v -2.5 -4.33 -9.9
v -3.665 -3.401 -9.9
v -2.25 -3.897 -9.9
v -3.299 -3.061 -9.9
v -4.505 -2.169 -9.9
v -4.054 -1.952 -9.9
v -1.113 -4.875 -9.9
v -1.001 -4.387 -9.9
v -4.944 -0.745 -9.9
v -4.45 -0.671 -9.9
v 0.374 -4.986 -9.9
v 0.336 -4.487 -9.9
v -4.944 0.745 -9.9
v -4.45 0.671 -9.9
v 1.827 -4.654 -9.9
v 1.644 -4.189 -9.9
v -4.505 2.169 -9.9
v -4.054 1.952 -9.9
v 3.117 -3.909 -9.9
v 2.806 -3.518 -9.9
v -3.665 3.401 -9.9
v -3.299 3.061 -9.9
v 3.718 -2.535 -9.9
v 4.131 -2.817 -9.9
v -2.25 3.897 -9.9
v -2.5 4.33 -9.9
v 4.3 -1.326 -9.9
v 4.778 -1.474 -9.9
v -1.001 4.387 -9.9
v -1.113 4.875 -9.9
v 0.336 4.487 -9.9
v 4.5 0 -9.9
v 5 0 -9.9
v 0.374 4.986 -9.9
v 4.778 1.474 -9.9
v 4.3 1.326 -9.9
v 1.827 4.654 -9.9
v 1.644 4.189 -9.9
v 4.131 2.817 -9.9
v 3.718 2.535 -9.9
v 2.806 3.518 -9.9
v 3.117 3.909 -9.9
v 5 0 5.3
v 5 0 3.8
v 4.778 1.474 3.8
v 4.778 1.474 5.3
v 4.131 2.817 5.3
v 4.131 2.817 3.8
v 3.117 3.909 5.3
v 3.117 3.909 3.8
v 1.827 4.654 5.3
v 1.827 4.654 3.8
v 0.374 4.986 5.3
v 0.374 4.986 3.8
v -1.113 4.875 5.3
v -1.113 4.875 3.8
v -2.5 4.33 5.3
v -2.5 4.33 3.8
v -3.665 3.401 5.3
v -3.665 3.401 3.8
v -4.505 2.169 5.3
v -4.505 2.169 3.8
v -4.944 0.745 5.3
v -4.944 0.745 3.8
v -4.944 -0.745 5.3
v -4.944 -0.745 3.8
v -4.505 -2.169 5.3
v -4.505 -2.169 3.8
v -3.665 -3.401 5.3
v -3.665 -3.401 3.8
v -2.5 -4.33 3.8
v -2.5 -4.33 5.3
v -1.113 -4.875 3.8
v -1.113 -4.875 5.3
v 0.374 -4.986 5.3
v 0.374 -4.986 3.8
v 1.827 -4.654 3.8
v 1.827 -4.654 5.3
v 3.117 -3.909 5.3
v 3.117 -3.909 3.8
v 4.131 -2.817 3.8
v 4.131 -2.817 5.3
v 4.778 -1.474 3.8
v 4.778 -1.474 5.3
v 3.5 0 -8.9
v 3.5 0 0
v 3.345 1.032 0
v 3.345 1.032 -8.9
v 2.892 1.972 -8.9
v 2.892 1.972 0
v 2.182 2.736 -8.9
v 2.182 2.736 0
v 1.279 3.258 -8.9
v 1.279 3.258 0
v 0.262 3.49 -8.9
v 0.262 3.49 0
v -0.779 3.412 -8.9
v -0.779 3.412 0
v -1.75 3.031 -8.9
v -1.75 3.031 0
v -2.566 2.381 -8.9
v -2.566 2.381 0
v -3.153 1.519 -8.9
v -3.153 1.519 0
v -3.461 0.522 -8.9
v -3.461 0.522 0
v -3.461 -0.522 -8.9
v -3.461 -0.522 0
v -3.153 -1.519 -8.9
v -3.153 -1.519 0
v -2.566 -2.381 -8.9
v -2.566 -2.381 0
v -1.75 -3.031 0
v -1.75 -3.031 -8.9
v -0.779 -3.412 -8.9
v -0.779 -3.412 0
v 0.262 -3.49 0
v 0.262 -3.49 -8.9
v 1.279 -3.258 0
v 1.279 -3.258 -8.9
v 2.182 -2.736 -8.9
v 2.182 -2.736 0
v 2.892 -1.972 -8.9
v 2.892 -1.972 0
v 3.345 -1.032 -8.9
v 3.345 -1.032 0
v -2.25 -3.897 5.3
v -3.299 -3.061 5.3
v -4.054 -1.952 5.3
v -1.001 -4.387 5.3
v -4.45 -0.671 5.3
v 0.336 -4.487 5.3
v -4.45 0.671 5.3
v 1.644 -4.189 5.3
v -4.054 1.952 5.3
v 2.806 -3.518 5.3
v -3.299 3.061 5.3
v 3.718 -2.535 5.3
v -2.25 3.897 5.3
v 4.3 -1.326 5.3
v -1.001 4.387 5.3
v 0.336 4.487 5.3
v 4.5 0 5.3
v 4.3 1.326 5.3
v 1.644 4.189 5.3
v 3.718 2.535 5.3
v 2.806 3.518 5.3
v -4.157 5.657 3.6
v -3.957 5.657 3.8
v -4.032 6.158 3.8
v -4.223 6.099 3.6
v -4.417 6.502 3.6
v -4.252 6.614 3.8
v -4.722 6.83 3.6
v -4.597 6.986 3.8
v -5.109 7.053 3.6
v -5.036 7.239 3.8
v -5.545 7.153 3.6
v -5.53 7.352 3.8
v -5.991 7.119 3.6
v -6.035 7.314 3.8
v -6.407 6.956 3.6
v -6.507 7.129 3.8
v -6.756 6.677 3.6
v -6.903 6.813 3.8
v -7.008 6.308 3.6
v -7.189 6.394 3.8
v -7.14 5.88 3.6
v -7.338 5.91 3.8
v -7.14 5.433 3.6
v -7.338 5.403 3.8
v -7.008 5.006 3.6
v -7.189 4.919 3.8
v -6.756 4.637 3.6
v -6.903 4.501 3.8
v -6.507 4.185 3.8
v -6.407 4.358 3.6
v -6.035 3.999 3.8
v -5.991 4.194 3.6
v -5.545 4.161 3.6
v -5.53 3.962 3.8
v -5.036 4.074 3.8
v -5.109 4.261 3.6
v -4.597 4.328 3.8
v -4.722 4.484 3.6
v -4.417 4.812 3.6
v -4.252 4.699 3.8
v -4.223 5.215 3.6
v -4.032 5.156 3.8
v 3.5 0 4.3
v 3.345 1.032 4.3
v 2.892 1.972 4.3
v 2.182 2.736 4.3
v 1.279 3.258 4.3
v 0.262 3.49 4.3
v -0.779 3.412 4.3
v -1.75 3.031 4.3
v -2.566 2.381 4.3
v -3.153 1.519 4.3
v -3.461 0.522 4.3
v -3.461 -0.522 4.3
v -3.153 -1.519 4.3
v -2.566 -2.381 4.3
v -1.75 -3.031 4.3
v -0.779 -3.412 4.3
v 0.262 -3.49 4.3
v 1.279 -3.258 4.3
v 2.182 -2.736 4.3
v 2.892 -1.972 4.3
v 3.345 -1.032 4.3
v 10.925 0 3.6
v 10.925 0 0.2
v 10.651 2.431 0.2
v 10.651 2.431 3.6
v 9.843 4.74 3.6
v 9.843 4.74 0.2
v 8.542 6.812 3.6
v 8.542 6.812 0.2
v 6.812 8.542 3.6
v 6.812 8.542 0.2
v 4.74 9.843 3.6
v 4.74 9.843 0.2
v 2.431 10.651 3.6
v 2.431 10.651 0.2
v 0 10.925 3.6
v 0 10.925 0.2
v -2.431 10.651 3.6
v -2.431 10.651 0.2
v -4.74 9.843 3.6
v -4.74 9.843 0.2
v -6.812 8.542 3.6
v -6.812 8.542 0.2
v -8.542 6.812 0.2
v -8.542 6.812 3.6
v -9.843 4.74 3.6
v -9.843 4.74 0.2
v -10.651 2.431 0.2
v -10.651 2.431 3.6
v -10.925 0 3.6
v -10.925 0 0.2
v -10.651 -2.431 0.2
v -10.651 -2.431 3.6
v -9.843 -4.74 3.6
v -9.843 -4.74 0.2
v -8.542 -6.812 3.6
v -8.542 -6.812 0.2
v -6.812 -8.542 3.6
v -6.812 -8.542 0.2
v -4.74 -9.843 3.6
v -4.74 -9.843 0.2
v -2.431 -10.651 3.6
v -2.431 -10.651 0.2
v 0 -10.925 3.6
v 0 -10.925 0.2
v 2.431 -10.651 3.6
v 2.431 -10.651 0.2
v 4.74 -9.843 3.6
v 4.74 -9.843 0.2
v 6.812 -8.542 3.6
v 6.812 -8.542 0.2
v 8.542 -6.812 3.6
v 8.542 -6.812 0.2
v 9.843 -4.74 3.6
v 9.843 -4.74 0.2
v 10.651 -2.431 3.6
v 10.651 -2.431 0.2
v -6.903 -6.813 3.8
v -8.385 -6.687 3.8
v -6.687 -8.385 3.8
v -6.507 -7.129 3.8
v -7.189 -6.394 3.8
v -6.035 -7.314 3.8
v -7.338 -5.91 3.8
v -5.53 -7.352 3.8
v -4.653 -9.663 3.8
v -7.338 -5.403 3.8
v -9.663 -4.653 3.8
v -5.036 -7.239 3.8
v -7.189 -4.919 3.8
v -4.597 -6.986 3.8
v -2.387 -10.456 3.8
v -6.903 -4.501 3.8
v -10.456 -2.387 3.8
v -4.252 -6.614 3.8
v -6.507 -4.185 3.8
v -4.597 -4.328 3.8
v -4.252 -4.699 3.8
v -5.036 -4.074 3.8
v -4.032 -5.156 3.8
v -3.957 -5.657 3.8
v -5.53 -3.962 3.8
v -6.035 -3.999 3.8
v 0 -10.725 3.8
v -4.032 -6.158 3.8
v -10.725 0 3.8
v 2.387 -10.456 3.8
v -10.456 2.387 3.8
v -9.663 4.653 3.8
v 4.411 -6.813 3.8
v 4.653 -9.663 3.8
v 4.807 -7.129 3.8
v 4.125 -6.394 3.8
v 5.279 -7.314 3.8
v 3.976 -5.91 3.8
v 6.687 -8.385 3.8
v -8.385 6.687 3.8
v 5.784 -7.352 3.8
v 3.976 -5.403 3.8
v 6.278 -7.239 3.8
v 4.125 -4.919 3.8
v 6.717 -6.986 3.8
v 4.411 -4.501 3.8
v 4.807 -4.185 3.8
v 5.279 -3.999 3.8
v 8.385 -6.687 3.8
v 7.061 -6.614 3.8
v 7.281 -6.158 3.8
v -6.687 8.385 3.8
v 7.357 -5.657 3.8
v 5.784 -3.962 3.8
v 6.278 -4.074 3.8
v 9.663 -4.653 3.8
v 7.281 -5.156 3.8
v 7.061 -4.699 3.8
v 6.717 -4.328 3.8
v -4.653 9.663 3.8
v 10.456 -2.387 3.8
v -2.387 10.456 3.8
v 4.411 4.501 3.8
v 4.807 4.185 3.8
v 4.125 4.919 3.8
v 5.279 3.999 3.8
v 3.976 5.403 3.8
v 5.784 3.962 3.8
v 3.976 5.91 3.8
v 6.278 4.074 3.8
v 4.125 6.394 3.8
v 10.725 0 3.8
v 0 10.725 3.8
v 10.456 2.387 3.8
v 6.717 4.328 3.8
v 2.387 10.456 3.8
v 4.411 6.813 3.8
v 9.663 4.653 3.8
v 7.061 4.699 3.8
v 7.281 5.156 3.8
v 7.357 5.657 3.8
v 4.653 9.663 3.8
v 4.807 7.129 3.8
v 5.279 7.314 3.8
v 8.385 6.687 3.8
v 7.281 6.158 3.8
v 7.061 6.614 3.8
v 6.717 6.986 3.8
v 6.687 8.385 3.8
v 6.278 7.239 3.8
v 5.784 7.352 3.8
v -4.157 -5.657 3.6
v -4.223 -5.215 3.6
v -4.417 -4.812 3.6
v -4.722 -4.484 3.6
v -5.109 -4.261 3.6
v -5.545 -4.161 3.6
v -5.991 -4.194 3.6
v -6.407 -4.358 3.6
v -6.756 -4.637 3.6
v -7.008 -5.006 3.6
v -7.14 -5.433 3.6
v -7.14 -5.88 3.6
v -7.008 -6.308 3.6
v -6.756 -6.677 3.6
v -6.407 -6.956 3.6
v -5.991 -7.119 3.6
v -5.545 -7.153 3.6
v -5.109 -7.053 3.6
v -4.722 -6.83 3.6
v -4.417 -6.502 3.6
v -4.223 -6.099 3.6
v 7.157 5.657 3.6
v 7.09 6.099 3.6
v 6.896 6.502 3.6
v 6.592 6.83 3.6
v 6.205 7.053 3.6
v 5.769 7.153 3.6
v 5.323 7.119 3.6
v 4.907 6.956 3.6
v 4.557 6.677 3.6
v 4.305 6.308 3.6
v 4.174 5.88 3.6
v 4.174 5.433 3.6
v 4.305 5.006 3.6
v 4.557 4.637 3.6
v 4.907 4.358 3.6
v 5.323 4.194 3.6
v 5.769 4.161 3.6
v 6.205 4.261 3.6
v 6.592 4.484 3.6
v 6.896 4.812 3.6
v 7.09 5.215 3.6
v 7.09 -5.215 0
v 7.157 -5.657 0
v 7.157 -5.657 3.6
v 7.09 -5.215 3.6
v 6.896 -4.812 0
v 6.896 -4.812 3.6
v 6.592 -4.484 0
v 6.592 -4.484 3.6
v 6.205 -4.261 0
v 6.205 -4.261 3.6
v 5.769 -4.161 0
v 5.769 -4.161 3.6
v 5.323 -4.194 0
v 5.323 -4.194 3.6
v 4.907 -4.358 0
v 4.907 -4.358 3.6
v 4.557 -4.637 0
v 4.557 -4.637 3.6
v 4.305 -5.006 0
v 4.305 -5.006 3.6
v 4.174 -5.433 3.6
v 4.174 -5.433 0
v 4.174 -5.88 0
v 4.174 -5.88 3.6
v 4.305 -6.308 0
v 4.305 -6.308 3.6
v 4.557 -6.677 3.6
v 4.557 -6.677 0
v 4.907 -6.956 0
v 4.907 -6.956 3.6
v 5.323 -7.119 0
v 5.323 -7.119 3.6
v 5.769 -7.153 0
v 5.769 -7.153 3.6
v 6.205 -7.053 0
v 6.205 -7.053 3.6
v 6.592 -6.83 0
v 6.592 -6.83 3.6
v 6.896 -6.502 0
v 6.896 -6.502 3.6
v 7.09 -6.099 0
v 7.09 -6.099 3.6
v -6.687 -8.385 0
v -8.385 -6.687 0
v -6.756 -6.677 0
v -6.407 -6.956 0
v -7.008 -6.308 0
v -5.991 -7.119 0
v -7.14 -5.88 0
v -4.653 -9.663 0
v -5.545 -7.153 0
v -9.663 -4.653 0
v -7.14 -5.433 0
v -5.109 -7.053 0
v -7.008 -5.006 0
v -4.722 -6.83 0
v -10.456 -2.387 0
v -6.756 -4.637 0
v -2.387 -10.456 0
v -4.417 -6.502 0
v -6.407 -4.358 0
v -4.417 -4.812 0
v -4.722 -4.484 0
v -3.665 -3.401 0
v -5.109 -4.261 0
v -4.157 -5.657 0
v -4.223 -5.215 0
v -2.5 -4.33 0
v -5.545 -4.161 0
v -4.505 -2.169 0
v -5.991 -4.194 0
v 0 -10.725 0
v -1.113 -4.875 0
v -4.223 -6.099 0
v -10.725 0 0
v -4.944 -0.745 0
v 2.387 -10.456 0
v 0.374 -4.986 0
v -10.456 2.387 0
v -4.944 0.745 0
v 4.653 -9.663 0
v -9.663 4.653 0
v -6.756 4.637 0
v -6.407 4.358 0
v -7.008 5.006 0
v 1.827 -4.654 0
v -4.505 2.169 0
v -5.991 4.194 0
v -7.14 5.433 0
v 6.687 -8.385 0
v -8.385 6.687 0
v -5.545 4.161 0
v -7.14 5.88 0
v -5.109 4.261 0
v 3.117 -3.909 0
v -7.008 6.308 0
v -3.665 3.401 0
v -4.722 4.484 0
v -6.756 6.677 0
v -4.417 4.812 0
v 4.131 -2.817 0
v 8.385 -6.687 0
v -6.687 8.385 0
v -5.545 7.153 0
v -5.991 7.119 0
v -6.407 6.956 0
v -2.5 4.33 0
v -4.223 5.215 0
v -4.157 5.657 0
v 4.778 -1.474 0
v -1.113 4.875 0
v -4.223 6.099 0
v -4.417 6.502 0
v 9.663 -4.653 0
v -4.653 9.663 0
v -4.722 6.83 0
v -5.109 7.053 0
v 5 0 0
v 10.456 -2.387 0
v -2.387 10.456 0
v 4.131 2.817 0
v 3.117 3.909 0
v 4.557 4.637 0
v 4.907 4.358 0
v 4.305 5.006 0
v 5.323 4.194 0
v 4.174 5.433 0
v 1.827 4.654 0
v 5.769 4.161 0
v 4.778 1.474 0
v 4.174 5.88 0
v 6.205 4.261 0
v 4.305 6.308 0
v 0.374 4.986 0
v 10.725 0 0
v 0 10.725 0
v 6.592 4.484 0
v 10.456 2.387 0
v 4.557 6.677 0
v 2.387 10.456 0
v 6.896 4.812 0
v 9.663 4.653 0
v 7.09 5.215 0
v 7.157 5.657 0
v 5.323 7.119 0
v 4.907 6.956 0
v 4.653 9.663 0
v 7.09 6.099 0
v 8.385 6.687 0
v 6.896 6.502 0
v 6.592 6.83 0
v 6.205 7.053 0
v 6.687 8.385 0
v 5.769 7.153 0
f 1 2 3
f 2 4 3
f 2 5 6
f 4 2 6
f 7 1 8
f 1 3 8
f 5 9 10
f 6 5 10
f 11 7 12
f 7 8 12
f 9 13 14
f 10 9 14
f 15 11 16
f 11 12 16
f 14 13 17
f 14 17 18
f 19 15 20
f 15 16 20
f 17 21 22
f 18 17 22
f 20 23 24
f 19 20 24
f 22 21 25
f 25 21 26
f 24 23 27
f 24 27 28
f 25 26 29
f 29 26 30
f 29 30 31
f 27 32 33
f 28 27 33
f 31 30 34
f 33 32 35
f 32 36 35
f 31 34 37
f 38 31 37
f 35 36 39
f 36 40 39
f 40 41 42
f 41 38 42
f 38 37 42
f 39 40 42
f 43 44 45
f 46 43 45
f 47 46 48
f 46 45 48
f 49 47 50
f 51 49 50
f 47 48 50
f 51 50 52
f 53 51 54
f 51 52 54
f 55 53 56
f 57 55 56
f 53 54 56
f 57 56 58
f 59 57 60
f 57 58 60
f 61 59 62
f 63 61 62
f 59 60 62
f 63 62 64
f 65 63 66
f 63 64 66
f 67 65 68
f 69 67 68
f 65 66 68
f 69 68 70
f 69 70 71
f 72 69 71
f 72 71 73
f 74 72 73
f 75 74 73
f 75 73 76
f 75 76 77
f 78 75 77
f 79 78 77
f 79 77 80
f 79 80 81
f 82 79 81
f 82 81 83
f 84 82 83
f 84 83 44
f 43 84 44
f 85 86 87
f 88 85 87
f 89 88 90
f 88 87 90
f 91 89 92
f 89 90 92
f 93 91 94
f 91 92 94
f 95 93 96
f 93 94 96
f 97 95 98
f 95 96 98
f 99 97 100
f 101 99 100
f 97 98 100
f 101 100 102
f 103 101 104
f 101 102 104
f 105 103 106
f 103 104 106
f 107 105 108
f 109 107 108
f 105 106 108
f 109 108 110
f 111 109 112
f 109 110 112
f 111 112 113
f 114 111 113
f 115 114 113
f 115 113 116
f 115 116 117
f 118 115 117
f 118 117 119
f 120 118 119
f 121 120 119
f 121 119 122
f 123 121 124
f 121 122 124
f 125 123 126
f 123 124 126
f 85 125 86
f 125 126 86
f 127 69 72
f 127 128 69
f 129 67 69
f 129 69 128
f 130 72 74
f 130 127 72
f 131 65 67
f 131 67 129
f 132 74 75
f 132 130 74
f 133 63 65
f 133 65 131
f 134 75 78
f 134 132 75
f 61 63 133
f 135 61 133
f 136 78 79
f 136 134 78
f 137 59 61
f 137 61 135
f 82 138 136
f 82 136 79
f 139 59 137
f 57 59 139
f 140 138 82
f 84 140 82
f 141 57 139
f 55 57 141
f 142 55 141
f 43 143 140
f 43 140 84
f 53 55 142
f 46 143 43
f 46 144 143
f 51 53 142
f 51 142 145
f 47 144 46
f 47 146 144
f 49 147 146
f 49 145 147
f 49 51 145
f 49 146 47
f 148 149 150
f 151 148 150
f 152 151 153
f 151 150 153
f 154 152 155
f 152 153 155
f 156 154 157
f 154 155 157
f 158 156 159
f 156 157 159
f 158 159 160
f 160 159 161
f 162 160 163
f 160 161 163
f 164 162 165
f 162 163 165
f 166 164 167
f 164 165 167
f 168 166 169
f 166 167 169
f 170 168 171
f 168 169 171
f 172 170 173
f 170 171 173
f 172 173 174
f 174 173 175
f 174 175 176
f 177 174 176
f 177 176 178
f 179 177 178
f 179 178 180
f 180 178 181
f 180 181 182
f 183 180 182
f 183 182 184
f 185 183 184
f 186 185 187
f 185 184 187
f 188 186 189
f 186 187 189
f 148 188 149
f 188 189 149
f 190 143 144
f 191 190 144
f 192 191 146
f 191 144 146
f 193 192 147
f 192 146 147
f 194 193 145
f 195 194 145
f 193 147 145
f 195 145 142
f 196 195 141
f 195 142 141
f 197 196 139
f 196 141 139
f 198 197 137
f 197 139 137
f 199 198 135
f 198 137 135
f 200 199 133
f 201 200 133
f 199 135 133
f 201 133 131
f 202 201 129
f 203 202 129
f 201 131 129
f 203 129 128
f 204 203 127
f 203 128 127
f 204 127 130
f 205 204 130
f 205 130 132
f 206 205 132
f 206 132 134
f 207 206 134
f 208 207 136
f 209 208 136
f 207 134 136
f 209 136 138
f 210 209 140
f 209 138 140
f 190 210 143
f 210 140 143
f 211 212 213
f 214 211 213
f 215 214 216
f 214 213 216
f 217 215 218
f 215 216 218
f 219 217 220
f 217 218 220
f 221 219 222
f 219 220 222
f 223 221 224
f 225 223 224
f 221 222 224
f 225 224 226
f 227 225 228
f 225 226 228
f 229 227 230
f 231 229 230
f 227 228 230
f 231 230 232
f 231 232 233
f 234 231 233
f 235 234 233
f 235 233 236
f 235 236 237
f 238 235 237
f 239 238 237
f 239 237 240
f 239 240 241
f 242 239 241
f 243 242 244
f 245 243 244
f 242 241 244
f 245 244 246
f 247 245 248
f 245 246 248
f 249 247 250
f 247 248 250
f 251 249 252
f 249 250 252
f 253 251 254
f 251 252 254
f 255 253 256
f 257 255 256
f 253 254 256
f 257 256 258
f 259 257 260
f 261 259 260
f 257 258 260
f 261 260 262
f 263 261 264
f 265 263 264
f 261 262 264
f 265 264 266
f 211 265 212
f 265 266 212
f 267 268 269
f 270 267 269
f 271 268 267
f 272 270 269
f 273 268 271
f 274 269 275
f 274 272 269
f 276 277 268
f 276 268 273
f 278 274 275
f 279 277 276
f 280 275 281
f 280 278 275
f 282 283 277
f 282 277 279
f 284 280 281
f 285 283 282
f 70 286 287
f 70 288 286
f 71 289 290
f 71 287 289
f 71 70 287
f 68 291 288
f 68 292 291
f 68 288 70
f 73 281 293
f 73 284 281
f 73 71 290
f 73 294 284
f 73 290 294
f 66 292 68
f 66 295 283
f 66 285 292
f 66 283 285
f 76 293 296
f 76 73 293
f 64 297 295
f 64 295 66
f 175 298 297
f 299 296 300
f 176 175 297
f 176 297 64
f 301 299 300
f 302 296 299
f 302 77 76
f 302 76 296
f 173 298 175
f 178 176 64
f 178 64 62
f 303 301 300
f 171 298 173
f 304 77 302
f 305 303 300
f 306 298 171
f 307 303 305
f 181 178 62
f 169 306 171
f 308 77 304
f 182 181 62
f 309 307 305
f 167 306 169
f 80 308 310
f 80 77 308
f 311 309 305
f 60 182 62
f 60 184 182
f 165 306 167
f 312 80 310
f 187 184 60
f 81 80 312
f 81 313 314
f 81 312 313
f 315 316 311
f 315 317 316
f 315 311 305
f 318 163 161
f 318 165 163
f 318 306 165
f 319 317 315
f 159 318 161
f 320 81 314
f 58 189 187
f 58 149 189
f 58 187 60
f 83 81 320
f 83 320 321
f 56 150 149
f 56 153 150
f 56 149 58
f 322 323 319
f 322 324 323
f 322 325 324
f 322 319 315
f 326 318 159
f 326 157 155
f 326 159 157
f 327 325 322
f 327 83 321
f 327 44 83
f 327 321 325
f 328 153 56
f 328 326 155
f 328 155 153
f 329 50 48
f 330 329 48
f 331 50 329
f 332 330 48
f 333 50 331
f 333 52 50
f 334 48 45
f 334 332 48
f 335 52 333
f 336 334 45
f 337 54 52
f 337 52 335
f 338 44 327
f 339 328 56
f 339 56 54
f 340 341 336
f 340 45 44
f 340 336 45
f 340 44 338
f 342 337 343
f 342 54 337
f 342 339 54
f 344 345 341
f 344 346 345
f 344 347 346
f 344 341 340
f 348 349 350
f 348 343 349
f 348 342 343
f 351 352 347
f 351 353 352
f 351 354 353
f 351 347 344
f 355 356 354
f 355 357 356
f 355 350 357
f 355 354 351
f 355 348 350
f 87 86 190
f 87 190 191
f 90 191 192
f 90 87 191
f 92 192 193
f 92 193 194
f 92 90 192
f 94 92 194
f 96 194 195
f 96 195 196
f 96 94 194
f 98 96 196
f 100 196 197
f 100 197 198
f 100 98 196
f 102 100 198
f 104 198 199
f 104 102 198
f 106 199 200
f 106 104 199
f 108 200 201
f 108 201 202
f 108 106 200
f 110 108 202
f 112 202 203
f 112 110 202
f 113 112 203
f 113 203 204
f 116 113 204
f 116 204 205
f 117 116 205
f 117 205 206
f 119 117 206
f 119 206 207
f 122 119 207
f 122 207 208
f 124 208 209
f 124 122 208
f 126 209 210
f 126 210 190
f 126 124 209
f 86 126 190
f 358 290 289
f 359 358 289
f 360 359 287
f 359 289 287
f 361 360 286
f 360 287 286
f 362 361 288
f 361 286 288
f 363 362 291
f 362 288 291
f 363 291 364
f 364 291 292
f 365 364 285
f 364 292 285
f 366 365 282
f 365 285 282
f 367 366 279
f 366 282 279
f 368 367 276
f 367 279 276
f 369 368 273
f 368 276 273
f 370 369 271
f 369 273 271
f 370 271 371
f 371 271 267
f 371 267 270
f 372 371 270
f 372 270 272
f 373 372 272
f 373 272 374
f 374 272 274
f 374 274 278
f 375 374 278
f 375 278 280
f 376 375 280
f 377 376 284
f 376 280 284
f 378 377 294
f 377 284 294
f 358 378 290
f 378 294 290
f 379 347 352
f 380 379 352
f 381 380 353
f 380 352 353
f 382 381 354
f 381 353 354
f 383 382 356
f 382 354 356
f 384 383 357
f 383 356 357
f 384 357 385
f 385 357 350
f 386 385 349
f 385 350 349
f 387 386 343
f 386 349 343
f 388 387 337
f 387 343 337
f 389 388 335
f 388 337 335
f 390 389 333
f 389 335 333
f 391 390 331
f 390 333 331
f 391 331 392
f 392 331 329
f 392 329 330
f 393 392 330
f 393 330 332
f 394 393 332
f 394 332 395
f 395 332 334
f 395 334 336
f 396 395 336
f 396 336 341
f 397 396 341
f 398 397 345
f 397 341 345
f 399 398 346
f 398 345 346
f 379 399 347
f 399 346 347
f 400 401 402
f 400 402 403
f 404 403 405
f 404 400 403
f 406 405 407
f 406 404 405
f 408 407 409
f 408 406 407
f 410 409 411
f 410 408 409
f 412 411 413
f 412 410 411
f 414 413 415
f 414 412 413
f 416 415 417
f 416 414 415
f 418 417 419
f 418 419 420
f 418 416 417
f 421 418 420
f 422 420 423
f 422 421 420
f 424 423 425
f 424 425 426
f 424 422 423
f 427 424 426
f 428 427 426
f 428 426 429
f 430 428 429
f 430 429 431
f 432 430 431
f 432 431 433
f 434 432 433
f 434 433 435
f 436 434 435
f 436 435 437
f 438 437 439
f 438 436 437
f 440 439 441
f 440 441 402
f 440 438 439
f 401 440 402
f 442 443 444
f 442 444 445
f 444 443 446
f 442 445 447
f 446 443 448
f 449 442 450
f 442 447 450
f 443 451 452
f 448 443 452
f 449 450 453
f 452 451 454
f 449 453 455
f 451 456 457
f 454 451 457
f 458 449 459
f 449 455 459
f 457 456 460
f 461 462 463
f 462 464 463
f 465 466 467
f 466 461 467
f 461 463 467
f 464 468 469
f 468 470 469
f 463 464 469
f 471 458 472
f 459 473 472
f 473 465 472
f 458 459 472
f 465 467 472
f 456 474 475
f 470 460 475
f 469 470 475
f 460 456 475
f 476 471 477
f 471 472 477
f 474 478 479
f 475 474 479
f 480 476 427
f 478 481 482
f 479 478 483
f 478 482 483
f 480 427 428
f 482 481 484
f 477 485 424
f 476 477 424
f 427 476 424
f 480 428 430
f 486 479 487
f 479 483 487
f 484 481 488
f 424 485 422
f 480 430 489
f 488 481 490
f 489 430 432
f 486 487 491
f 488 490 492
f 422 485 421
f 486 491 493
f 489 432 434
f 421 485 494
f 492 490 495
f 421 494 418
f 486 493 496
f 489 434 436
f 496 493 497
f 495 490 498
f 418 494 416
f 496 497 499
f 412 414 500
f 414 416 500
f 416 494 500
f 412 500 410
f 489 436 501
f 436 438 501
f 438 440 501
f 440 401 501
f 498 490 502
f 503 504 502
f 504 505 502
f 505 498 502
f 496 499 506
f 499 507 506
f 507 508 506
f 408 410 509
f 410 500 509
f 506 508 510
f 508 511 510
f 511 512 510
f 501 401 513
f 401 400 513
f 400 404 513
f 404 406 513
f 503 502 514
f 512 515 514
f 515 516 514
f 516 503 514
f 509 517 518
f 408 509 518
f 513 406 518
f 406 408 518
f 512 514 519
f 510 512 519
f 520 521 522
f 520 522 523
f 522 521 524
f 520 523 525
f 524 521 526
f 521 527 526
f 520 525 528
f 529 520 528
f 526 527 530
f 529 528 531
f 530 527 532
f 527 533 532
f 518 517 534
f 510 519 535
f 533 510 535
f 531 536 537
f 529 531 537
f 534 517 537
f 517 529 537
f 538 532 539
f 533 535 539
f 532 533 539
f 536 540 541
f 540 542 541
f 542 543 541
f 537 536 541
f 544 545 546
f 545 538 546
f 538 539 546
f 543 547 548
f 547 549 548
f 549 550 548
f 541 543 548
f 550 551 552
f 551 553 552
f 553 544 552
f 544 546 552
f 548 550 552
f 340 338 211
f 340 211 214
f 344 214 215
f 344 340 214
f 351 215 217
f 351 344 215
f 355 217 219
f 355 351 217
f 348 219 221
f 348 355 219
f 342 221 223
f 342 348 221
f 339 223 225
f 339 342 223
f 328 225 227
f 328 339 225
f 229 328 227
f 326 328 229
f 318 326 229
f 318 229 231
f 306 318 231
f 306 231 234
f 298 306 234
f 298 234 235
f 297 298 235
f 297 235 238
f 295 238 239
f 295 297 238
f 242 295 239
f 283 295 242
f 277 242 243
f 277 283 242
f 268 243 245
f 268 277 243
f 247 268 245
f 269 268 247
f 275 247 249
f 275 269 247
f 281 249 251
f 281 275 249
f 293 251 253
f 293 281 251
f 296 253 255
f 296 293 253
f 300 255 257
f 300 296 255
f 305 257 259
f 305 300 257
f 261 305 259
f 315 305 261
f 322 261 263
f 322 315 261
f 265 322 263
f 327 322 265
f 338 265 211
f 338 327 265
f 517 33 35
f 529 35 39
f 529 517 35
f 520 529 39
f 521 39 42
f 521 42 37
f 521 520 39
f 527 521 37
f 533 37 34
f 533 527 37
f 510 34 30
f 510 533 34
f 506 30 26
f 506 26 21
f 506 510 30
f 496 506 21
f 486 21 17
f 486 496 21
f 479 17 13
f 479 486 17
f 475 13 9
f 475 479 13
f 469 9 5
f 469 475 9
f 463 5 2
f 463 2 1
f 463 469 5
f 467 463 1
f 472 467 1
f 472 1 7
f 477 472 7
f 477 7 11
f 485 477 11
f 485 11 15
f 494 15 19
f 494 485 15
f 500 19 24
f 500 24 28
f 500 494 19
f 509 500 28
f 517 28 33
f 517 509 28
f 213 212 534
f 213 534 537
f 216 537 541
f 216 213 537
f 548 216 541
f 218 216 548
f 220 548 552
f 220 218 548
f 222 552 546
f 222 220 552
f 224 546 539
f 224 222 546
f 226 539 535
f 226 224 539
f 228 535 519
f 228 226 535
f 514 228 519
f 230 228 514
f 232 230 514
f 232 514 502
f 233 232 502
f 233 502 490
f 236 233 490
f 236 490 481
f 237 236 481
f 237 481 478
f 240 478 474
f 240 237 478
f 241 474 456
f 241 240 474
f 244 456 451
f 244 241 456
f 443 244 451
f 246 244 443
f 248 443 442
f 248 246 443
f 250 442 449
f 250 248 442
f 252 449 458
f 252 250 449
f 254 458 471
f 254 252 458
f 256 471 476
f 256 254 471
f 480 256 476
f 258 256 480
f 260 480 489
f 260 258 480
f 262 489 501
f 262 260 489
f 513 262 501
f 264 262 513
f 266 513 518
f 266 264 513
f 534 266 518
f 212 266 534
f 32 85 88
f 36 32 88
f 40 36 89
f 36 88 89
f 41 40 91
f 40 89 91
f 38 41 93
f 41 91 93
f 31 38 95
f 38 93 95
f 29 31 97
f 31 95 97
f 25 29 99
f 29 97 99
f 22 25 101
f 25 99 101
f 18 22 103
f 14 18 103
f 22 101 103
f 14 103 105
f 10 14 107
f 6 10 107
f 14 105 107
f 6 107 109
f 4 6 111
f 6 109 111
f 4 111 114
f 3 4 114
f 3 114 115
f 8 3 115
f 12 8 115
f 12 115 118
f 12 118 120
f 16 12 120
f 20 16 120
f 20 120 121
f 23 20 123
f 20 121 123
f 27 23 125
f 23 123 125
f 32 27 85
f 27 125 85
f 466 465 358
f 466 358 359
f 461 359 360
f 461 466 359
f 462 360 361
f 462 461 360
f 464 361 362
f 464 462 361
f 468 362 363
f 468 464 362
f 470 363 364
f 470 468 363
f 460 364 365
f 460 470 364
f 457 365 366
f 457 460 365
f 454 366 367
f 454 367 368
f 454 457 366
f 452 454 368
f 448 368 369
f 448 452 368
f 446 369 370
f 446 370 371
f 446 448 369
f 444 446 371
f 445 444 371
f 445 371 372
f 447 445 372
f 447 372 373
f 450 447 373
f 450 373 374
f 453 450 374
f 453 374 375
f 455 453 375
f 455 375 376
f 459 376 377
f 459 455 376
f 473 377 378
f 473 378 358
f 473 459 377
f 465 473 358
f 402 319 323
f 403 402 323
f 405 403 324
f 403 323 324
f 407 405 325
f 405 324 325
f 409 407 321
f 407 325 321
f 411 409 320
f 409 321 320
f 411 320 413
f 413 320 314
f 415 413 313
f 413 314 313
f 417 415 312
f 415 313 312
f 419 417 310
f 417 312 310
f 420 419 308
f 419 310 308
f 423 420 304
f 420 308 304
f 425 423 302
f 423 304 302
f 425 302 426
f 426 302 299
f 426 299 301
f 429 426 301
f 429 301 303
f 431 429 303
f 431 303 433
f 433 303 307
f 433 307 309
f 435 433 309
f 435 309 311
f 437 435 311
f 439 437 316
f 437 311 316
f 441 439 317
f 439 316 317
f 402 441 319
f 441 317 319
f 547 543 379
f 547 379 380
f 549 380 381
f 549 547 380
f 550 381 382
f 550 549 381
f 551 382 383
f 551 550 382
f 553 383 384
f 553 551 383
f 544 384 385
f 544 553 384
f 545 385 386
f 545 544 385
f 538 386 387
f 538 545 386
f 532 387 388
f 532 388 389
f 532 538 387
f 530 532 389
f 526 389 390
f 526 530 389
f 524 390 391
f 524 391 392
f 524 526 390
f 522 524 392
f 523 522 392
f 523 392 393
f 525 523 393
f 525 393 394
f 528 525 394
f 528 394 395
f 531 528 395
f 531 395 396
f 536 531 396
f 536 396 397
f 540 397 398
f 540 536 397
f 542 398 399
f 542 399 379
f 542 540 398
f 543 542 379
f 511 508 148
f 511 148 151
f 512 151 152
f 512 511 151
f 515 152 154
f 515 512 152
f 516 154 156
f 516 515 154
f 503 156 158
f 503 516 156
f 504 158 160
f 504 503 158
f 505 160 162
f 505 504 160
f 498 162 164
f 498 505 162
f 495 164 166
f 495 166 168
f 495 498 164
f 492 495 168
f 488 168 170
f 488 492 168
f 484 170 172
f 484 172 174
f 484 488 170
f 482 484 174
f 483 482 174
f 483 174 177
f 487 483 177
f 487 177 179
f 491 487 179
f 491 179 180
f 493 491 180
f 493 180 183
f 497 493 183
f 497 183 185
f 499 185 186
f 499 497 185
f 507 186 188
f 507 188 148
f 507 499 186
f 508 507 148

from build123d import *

# Parameters (mm, degrees)
F0_R     = 10.925
F0_R_2   = 1.5
F0_R_3   = 5
F1_DEPTH = 3.8
F0_R_4   = 3.5
F2_DEPTH = 5.3
F3_DEPTH = 9.9
F4_SIZE  = 1
F5_SIZE  = 0.2


with BuildPart() as f1:
    # F0 (on Top) → F1 (new body)
    with BuildSketch(Plane.XY):
        Circle(F0_R)
        with Locations((-5.656854, -5.656854)):
            Circle(F0_R_2, mode=Mode.SUBTRACT)
        with Locations((5.656854, -5.656854)):
            Circle(F0_R_2, mode=Mode.SUBTRACT)
        with Locations((-5.656854, 5.656854)):
            Circle(F0_R_2, mode=Mode.SUBTRACT)
        Circle(F0_R_3, mode=Mode.SUBTRACT)
        with Locations((5.656854, 5.656854)):
            Circle(F0_R_2, mode=Mode.SUBTRACT)
    extrude(amount=F1_DEPTH)

    # F0 (on Top) → F2 (join)
    with BuildSketch(Plane.XY):
        Circle(F0_R_3)
        Circle(F0_R_4, mode=Mode.SUBTRACT)
    extrude(amount=F2_DEPTH)

    # F0 (on Top) → F3 (join)
    with BuildSketch(Plane.XY):
        Circle(F0_R_3)
        Circle(F0_R_4, mode=Mode.SUBTRACT)
    extrude(amount=-F3_DEPTH)

    # F4
    f4_edges = [f1.edges().sort_by_distance(p)[0] for p in [
        (-3.5, 0, 5.3),
        (-3.5, 0, -9.9),
    ]]
    chamfer(f4_edges, length=F4_SIZE)

    # F5
    f5_edges = [f1.edges().sort_by_distance(p)[0] for p in [
        (-7.156854, 5.656854, 3.8),
        (-7.156854, -5.656854, 3.8),
        (4.156854, -5.656854, 3.8),
        (4.156854, 5.656854, 3.8),
        (-10.925, 0, 3.8),
        (-10.925, 0, 0),
    ]]
    chamfer(f5_edges, length=F5_SIZE)


solid = f1.part
